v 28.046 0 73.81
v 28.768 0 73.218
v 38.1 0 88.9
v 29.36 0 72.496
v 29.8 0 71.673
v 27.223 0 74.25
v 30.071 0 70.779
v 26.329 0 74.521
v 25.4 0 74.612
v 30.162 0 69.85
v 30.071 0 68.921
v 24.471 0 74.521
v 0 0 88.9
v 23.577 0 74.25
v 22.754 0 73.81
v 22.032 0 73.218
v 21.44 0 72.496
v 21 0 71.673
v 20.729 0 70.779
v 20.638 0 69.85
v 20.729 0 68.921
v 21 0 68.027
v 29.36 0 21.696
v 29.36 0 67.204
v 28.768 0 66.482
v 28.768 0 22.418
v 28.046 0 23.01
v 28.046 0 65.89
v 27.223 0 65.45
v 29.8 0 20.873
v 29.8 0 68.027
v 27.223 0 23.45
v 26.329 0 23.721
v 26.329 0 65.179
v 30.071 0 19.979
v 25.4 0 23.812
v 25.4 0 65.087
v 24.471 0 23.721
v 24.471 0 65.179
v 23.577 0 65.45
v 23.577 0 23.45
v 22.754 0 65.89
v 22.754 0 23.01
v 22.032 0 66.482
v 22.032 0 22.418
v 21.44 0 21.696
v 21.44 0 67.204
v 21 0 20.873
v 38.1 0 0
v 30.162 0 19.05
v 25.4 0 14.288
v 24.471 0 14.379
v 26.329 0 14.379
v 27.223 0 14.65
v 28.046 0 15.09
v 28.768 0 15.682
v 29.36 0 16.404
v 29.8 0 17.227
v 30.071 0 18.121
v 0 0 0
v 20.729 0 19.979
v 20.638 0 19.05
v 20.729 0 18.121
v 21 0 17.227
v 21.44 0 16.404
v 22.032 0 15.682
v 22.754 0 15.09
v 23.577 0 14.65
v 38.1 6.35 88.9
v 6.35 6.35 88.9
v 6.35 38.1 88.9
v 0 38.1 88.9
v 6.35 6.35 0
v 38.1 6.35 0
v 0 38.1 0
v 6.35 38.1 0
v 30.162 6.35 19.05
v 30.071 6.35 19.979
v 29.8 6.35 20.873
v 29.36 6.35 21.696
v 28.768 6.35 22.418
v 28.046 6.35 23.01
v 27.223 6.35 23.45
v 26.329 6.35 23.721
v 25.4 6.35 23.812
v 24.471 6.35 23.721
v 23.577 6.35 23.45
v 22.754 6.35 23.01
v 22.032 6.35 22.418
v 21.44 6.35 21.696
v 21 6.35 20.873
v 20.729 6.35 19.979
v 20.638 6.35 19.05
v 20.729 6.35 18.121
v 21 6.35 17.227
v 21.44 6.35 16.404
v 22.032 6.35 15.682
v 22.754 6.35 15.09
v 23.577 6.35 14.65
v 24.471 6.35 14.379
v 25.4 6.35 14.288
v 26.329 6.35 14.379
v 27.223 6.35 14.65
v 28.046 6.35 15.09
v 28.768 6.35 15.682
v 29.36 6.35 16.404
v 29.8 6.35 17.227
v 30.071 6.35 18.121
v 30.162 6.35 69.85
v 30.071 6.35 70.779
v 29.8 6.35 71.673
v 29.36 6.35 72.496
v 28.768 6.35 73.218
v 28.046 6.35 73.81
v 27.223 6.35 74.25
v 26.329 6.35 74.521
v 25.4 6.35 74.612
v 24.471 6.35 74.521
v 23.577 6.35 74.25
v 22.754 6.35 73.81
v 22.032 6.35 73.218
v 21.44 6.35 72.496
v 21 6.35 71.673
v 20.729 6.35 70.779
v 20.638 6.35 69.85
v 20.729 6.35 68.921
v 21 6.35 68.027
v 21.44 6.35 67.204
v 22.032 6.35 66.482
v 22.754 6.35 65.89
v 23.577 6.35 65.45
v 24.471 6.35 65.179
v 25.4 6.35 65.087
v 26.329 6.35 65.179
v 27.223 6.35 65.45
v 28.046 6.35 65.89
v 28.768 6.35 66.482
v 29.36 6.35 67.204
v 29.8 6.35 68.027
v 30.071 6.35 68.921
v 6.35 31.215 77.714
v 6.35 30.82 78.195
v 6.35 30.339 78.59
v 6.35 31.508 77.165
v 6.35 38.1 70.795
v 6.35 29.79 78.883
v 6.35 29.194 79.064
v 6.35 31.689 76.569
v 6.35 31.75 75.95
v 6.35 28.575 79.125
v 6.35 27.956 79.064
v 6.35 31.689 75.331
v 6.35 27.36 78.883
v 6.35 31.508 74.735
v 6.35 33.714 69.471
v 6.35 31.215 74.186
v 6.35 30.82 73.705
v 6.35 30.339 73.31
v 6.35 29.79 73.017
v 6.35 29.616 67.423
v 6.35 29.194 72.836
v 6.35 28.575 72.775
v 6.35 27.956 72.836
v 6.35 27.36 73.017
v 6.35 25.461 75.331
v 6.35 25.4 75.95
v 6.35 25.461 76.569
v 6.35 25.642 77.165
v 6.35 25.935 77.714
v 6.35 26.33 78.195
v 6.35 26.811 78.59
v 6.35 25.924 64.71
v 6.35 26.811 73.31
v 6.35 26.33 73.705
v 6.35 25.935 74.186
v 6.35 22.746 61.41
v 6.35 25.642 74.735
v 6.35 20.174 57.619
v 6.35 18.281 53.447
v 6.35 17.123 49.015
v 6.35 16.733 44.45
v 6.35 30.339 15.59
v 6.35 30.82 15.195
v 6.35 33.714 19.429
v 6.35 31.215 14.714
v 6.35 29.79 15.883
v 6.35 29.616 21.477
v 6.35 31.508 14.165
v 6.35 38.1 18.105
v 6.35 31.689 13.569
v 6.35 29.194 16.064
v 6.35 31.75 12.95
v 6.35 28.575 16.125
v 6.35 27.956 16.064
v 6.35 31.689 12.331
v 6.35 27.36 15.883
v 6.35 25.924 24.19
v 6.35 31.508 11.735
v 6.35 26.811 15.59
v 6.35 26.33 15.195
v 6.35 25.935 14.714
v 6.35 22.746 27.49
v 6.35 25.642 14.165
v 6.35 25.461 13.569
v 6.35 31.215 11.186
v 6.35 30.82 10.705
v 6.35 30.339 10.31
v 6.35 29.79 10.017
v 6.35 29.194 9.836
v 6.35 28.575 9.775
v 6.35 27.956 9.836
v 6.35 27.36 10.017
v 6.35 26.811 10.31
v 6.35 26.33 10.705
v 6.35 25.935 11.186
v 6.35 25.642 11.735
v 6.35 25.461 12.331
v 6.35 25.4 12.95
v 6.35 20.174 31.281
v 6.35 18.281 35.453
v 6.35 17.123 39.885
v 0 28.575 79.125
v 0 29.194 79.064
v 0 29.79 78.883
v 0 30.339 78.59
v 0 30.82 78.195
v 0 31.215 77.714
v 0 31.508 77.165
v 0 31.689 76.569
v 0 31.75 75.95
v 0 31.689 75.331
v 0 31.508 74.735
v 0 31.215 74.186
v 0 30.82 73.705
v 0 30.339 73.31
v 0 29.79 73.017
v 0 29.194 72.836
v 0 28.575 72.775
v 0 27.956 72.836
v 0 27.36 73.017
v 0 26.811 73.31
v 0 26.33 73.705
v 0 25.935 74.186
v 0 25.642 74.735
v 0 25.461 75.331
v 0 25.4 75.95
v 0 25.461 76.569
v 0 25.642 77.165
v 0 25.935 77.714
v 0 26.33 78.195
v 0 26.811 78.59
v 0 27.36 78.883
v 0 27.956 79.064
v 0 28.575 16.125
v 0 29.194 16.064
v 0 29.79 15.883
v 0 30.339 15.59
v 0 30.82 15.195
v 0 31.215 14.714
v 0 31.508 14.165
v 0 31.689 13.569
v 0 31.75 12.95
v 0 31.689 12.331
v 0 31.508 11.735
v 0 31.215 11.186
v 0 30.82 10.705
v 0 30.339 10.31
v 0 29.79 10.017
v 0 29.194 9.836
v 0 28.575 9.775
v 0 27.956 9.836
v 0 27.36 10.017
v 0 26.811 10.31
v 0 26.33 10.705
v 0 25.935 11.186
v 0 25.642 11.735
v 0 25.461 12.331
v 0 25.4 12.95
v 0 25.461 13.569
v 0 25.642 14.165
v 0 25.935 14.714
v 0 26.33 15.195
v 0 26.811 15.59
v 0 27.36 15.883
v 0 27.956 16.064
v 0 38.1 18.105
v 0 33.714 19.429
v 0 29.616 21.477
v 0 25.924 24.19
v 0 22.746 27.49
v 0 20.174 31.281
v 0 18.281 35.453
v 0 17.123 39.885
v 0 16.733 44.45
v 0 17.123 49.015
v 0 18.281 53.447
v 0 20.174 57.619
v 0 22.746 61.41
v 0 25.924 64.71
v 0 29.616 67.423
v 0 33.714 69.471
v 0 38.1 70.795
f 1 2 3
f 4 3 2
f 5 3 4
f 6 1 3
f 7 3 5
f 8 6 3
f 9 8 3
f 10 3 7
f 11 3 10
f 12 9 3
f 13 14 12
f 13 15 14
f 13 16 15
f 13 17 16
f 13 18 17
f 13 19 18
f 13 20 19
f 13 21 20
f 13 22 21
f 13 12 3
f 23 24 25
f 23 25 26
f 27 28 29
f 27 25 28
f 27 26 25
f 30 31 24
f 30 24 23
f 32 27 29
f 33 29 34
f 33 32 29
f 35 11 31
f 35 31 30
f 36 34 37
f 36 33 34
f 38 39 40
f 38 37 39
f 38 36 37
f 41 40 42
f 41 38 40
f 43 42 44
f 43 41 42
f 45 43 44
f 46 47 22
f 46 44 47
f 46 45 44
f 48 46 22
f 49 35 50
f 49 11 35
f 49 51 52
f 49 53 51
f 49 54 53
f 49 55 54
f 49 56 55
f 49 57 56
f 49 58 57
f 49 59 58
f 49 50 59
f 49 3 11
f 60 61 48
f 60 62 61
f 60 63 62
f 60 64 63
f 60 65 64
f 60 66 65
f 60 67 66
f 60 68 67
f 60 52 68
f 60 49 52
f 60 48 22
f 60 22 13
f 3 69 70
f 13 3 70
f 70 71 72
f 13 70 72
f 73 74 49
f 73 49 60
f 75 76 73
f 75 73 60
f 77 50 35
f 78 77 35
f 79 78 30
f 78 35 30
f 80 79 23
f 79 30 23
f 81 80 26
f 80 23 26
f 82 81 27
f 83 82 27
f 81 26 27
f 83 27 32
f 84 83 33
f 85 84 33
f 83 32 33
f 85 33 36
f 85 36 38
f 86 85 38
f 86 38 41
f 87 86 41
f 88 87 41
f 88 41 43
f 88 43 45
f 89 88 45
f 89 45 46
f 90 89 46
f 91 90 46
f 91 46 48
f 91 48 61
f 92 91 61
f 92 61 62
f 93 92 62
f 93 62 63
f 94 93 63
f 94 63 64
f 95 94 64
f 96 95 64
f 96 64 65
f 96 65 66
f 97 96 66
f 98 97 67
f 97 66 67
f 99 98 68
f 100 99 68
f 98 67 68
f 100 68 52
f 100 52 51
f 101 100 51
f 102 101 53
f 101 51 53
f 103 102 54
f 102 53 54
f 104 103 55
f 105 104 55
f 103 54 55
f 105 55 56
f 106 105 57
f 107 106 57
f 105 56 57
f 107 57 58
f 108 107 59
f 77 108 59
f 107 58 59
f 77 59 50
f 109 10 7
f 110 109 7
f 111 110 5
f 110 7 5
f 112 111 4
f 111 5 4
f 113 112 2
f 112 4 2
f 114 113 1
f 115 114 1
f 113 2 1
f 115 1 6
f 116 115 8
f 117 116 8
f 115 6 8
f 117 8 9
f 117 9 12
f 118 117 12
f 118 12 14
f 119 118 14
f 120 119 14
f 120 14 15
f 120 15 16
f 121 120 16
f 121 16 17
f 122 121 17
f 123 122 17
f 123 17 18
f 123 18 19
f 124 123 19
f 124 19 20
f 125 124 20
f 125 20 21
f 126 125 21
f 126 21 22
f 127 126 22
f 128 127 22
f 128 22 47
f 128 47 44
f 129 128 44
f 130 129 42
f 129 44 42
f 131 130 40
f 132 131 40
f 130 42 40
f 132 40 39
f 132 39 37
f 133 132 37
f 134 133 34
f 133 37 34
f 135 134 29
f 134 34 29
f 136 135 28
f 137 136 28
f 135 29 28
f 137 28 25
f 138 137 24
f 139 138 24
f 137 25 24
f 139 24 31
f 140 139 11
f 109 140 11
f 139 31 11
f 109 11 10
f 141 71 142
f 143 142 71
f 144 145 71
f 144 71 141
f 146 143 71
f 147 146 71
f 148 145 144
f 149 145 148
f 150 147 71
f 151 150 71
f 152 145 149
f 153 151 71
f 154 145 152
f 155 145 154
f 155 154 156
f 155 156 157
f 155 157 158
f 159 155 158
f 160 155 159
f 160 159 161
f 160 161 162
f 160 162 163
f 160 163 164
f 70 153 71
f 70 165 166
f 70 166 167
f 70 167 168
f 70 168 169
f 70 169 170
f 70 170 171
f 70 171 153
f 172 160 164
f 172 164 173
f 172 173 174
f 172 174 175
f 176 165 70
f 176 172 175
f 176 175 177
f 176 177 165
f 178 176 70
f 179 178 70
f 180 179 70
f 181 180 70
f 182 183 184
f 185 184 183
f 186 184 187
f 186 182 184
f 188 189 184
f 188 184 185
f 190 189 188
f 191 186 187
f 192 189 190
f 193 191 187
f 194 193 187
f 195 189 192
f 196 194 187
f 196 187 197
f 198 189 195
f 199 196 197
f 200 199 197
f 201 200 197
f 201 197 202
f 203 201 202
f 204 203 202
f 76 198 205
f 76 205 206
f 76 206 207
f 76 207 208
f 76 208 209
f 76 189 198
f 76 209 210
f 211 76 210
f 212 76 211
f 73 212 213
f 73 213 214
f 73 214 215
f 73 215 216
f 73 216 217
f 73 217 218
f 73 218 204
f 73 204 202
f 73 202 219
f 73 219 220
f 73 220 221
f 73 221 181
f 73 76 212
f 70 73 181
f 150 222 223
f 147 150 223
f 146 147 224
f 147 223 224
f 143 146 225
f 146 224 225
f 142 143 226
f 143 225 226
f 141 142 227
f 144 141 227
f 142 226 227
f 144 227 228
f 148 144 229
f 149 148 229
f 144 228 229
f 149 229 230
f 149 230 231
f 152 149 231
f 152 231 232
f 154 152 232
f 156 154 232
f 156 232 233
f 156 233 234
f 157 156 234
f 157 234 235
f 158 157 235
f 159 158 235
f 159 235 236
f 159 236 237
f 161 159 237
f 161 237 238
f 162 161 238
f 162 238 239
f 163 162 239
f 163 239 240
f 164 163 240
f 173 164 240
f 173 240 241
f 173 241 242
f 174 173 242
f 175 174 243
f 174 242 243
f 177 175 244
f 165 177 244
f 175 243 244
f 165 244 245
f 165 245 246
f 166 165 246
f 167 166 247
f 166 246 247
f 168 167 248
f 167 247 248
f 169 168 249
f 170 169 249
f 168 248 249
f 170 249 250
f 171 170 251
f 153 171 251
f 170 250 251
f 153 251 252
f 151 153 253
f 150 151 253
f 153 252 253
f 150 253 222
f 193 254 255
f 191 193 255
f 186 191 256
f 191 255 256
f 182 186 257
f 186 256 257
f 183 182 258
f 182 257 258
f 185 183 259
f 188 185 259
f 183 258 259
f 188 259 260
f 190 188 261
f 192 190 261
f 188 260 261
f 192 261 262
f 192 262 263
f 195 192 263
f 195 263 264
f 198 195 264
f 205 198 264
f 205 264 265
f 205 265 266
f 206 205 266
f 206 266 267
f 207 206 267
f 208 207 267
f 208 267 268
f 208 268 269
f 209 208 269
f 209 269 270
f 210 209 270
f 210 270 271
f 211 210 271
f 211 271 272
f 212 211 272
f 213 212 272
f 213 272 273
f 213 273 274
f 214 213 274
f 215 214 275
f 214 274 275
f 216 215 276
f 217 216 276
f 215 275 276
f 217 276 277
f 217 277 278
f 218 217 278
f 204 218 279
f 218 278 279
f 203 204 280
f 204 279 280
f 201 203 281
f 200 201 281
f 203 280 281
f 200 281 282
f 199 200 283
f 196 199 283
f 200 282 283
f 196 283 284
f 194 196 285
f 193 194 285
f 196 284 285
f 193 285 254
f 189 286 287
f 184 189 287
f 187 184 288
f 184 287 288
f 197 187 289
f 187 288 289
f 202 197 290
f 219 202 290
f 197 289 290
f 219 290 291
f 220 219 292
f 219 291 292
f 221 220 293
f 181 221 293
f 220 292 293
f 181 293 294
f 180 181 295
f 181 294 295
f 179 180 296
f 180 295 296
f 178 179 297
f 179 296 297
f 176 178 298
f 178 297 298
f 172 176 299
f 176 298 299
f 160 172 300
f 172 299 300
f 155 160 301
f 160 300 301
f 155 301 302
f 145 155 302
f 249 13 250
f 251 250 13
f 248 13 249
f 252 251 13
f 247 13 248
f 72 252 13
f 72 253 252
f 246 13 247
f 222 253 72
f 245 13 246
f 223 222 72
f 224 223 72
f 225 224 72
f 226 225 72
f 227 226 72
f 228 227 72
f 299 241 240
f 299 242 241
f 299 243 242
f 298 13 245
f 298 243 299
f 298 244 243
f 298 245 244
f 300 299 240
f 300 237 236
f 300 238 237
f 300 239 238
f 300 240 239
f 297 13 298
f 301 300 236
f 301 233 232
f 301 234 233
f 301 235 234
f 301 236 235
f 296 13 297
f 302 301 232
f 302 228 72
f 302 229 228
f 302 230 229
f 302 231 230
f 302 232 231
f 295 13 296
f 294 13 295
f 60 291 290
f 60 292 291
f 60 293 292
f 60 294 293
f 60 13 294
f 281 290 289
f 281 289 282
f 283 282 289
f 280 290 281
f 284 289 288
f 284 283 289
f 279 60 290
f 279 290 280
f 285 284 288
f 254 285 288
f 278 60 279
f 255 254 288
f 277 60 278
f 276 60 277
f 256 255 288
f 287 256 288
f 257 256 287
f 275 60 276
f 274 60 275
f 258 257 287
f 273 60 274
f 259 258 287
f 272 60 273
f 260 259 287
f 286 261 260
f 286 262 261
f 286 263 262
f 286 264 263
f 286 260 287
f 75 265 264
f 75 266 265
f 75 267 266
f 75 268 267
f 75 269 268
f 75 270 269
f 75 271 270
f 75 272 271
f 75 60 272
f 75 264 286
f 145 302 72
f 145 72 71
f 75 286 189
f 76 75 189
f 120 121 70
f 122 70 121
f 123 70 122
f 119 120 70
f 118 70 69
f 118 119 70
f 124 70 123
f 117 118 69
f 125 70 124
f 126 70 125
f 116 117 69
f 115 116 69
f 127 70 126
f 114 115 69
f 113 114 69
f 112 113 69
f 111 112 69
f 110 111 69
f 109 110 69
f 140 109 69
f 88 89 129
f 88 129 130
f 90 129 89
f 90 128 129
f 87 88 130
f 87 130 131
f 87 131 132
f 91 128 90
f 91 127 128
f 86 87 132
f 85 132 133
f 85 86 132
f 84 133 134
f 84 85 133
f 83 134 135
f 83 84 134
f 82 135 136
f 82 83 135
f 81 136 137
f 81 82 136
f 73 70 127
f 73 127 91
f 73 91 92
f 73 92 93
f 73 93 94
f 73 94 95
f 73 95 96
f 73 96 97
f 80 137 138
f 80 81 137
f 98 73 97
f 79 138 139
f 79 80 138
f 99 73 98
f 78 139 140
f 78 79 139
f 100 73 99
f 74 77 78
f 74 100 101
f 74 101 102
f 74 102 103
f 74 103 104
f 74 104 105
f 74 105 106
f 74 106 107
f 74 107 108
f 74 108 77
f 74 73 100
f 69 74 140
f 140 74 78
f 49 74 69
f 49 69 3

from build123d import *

# Parameters (mm, degrees)
BOSS_EXTRUDE1_DEPTH = 88.9
SKETCH2_R           = 3.175
CUT_EXTRUDE1_DEPTH  = 76.2
SKETCH3_R           = 4.7625
CUT_EXTRUDE2_DEPTH  = 39.1


with BuildPart() as part:
    # Sketch1 → Boss-Extrude1 (new body)
    with BuildSketch(Plane.XY):
        Polygon((0, 0), (0, 38.1), (6.35, 38.1), (6.35, 6.35), (38.1, 6.35), (38.1, 0), align=None)
    extrude(amount=BOSS_EXTRUDE1_DEPTH)

    # Sketch2 → Cut-Extrude1 (cut)
    with BuildSketch(Plane.ZY):
        with Locations((12.95, 28.575)):
            Circle(SKETCH2_R)
        with Locations((75.95, 28.575)):
            Circle(SKETCH2_R)
        with BuildLine():
            ThreePointArc((18.104961724, 38.1), (44.45, 16.733289595), (70.795038276, 38.1))
            Line((70.795038276, 38.1), (18.104961724, 38.1))
        make_face()
    extrude(amount=-CUT_EXTRUDE1_DEPTH, mode=Mode.SUBTRACT)

    # Sketch3 → Cut-Extrude2 (cut, through all)
    with BuildSketch(Plane.XZ):
        with Locations((25.4, 69.85)):
            Circle(SKETCH3_R)
        with Locations((25.4, 19.05)):
            Circle(SKETCH3_R)
    extrude(amount=-CUT_EXTRUDE2_DEPTH, mode=Mode.SUBTRACT)


solid = part.part
